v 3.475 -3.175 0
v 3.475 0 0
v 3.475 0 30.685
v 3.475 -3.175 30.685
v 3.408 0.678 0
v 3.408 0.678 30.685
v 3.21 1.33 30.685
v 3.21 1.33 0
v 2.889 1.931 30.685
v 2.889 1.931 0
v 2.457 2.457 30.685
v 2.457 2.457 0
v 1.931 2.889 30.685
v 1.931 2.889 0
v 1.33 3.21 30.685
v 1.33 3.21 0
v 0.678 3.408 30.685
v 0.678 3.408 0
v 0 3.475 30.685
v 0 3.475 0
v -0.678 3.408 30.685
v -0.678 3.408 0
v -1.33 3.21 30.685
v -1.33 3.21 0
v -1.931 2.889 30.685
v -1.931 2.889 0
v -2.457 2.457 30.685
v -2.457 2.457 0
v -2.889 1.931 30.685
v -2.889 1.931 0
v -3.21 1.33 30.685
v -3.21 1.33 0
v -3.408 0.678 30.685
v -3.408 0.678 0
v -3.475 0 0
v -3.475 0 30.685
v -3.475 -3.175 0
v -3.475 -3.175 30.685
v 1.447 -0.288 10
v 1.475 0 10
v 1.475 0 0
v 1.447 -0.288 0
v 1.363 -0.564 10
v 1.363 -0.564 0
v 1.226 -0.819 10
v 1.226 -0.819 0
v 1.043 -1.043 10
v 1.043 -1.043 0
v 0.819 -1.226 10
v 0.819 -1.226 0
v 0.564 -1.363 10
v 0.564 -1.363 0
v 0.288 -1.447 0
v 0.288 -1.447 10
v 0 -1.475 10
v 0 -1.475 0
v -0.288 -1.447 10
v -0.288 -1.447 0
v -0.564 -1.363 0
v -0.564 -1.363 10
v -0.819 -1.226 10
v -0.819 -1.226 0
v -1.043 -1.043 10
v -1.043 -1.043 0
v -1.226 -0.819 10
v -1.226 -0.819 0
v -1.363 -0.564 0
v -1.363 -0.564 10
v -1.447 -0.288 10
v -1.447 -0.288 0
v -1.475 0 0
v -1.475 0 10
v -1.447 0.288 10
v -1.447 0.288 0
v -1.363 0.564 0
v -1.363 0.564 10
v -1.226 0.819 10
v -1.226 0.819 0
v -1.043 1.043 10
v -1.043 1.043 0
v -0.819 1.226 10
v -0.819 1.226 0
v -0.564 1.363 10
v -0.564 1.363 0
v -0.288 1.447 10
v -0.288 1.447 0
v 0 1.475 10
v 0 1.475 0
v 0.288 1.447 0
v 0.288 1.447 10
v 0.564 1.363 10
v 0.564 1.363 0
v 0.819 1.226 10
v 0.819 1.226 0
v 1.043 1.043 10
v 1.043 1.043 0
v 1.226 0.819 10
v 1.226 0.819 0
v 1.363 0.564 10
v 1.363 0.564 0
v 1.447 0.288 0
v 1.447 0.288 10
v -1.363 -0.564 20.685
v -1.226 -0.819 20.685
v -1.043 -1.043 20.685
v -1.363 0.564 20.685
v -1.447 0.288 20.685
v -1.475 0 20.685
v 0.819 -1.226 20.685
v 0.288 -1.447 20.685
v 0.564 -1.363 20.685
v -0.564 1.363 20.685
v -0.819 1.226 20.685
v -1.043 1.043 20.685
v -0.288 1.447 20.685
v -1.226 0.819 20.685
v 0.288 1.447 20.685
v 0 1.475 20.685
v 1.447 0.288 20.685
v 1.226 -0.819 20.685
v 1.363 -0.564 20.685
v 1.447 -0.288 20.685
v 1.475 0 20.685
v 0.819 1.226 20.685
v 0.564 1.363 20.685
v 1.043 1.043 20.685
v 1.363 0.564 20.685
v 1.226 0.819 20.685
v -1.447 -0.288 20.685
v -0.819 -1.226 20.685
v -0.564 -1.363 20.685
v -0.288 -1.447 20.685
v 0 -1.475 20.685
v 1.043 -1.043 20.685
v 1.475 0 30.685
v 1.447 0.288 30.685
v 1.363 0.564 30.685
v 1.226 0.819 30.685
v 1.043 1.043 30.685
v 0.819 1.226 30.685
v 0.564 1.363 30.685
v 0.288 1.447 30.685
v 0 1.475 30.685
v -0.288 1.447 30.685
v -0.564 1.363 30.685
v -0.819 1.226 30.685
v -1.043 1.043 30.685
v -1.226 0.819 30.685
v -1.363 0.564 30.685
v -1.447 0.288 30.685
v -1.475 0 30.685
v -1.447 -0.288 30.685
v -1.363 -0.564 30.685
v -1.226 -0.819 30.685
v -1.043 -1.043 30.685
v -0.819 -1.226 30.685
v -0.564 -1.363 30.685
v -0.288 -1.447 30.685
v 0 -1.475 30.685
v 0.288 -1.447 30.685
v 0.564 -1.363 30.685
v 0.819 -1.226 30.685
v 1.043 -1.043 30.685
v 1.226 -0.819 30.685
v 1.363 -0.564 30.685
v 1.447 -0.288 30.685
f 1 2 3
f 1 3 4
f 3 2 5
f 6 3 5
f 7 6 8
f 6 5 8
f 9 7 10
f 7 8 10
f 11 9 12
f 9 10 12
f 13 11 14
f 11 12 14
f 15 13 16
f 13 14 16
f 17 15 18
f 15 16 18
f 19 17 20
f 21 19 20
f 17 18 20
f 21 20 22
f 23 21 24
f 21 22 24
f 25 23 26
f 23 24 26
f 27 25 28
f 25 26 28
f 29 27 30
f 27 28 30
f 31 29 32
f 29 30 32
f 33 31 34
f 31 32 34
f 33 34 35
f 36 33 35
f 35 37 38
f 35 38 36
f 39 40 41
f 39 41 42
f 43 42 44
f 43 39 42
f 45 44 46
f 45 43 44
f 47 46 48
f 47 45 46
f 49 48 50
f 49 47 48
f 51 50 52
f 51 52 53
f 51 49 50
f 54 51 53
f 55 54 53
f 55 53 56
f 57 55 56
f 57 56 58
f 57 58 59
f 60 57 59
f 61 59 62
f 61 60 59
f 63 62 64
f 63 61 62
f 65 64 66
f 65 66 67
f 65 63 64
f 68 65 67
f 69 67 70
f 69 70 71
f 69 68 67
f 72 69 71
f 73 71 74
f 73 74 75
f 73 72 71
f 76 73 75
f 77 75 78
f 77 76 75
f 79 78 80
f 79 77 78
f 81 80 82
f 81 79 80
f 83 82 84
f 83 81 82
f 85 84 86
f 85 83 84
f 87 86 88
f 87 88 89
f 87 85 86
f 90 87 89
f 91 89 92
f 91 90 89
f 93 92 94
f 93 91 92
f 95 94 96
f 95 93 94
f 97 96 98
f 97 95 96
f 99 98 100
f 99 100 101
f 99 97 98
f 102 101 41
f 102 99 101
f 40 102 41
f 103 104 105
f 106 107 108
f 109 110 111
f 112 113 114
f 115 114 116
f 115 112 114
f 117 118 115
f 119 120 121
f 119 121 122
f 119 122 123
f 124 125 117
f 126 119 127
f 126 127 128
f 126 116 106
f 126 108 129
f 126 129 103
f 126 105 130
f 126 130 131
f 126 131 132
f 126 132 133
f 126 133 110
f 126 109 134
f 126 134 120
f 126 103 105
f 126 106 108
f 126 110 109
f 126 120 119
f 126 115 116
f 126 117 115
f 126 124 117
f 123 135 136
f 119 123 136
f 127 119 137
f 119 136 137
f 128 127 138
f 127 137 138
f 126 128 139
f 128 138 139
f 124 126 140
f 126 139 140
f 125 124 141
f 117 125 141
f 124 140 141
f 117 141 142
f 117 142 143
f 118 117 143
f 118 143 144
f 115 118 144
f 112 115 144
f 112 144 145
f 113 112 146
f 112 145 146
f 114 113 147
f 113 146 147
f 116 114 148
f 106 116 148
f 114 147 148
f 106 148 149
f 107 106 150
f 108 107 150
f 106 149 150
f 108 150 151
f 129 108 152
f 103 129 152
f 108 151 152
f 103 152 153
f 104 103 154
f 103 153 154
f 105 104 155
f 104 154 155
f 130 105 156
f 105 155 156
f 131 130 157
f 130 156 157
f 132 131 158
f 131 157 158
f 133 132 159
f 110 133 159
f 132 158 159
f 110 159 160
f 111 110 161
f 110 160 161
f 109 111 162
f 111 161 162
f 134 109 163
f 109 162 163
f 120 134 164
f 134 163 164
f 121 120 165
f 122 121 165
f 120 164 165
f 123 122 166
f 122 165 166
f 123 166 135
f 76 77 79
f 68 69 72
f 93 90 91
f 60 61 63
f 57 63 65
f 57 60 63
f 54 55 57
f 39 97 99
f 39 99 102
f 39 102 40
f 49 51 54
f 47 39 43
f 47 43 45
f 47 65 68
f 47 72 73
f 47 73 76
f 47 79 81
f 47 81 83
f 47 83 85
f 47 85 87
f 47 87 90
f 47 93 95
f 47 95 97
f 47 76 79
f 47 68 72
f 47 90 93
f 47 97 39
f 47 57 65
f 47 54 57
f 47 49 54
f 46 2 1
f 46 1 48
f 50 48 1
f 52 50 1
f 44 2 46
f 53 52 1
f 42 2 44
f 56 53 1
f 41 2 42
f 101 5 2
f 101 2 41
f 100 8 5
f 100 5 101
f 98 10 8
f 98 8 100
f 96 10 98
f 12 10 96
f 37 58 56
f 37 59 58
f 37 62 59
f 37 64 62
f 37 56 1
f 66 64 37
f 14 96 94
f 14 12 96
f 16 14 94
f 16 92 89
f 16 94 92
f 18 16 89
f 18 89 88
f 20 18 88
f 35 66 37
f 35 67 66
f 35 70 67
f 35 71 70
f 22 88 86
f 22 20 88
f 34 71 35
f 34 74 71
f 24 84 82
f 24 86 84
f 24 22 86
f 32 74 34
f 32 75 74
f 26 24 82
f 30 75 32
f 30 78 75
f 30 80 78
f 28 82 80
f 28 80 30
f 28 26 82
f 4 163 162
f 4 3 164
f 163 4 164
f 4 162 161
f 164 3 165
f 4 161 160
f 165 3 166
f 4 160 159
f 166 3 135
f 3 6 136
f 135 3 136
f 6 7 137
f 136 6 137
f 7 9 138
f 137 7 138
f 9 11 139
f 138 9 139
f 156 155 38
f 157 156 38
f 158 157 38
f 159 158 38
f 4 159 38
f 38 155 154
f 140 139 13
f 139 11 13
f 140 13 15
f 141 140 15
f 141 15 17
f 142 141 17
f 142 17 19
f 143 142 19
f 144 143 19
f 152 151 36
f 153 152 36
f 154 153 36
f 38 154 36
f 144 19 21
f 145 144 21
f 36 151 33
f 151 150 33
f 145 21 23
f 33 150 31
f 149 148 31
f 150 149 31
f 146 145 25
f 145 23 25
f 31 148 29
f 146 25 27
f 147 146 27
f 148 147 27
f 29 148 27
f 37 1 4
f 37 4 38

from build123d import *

# Parameters (mm, degrees)
SKETCH2_R           = 3.475
BOSS_EXTRUDE2_DEPTH = 30.6846
SKETCH3_R           = 1.475
CUT_EXTRUDE1_DEPTH  = 10
CUT_EXTRUDE2_START  = -10
SKETCH4_R           = 1.475
CUT_EXTRUDE2_DEPTH  = 10
BOSS_EXTRUDE3_DEPTH = 30.6846
SKETCH6_W           = 6.95
SKETCH6_H           = 30.6846
CUT_EXTRUDE3_DEPTH  = 0.3


with BuildPart() as part:
    # Sketch2 → Boss-Extrude2 (new body)
    with BuildSketch(Plane.XY):
        Circle(SKETCH2_R)
    extrude(amount=BOSS_EXTRUDE2_DEPTH)

    # Sketch3 → Cut-Extrude1 (cut)
    with BuildSketch(Plane.XY.offset(30.6846)):
        Circle(SKETCH3_R)
    extrude(amount=-CUT_EXTRUDE1_DEPTH, mode=Mode.SUBTRACT)

    # Sketch4 → Cut-Extrude2 (cut)
    with BuildSketch(Plane(origin=(0, 0, 0), x_dir=(-1, 0, 0), z_dir=(0, 0, -1)).offset(CUT_EXTRUDE2_START)):
        with Locations(Location((0, 0, 0), (0, 0, 180))):
            Circle(SKETCH4_R)
    extrude(amount=CUT_EXTRUDE2_DEPTH, mode=Mode.SUBTRACT)

    # Sketch5 → Boss-Extrude3 (add)
    with BuildSketch(Plane(origin=(0, 0, 0), x_dir=(-1, 0, 0), z_dir=(0, 0, -1))):
        with BuildLine():
            ThreePointArc((0, -3.475), (-2.457196065, -2.457196065), (-3.475, 0))
            Line((-3.475, 0), (-3.475, -3.475))
            Line((-3.475, -3.475), (0, -3.475))
        make_face()
        with BuildLine():
            Line((3.475, -3.475), (3.475, 0))
            ThreePointArc((3.475, 0), (2.457196065, -2.457196065), (0, -3.475))
            Line((0, -3.475), (3.475, -3.475))
        make_face()
    extrude(amount=-BOSS_EXTRUDE3_DEPTH)

    # Sketch6 → Cut-Extrude3 (cut)
    with BuildSketch(Plane(origin=(0, -3.475, 0), x_dir=(-1, 0, 0), z_dir=(0, -1, 0))):
        with Locations((0, -15.3423)):
            Rectangle(SKETCH6_W, SKETCH6_H)
    extrude(amount=-CUT_EXTRUDE3_DEPTH, mode=Mode.SUBTRACT)


solid = part.part
